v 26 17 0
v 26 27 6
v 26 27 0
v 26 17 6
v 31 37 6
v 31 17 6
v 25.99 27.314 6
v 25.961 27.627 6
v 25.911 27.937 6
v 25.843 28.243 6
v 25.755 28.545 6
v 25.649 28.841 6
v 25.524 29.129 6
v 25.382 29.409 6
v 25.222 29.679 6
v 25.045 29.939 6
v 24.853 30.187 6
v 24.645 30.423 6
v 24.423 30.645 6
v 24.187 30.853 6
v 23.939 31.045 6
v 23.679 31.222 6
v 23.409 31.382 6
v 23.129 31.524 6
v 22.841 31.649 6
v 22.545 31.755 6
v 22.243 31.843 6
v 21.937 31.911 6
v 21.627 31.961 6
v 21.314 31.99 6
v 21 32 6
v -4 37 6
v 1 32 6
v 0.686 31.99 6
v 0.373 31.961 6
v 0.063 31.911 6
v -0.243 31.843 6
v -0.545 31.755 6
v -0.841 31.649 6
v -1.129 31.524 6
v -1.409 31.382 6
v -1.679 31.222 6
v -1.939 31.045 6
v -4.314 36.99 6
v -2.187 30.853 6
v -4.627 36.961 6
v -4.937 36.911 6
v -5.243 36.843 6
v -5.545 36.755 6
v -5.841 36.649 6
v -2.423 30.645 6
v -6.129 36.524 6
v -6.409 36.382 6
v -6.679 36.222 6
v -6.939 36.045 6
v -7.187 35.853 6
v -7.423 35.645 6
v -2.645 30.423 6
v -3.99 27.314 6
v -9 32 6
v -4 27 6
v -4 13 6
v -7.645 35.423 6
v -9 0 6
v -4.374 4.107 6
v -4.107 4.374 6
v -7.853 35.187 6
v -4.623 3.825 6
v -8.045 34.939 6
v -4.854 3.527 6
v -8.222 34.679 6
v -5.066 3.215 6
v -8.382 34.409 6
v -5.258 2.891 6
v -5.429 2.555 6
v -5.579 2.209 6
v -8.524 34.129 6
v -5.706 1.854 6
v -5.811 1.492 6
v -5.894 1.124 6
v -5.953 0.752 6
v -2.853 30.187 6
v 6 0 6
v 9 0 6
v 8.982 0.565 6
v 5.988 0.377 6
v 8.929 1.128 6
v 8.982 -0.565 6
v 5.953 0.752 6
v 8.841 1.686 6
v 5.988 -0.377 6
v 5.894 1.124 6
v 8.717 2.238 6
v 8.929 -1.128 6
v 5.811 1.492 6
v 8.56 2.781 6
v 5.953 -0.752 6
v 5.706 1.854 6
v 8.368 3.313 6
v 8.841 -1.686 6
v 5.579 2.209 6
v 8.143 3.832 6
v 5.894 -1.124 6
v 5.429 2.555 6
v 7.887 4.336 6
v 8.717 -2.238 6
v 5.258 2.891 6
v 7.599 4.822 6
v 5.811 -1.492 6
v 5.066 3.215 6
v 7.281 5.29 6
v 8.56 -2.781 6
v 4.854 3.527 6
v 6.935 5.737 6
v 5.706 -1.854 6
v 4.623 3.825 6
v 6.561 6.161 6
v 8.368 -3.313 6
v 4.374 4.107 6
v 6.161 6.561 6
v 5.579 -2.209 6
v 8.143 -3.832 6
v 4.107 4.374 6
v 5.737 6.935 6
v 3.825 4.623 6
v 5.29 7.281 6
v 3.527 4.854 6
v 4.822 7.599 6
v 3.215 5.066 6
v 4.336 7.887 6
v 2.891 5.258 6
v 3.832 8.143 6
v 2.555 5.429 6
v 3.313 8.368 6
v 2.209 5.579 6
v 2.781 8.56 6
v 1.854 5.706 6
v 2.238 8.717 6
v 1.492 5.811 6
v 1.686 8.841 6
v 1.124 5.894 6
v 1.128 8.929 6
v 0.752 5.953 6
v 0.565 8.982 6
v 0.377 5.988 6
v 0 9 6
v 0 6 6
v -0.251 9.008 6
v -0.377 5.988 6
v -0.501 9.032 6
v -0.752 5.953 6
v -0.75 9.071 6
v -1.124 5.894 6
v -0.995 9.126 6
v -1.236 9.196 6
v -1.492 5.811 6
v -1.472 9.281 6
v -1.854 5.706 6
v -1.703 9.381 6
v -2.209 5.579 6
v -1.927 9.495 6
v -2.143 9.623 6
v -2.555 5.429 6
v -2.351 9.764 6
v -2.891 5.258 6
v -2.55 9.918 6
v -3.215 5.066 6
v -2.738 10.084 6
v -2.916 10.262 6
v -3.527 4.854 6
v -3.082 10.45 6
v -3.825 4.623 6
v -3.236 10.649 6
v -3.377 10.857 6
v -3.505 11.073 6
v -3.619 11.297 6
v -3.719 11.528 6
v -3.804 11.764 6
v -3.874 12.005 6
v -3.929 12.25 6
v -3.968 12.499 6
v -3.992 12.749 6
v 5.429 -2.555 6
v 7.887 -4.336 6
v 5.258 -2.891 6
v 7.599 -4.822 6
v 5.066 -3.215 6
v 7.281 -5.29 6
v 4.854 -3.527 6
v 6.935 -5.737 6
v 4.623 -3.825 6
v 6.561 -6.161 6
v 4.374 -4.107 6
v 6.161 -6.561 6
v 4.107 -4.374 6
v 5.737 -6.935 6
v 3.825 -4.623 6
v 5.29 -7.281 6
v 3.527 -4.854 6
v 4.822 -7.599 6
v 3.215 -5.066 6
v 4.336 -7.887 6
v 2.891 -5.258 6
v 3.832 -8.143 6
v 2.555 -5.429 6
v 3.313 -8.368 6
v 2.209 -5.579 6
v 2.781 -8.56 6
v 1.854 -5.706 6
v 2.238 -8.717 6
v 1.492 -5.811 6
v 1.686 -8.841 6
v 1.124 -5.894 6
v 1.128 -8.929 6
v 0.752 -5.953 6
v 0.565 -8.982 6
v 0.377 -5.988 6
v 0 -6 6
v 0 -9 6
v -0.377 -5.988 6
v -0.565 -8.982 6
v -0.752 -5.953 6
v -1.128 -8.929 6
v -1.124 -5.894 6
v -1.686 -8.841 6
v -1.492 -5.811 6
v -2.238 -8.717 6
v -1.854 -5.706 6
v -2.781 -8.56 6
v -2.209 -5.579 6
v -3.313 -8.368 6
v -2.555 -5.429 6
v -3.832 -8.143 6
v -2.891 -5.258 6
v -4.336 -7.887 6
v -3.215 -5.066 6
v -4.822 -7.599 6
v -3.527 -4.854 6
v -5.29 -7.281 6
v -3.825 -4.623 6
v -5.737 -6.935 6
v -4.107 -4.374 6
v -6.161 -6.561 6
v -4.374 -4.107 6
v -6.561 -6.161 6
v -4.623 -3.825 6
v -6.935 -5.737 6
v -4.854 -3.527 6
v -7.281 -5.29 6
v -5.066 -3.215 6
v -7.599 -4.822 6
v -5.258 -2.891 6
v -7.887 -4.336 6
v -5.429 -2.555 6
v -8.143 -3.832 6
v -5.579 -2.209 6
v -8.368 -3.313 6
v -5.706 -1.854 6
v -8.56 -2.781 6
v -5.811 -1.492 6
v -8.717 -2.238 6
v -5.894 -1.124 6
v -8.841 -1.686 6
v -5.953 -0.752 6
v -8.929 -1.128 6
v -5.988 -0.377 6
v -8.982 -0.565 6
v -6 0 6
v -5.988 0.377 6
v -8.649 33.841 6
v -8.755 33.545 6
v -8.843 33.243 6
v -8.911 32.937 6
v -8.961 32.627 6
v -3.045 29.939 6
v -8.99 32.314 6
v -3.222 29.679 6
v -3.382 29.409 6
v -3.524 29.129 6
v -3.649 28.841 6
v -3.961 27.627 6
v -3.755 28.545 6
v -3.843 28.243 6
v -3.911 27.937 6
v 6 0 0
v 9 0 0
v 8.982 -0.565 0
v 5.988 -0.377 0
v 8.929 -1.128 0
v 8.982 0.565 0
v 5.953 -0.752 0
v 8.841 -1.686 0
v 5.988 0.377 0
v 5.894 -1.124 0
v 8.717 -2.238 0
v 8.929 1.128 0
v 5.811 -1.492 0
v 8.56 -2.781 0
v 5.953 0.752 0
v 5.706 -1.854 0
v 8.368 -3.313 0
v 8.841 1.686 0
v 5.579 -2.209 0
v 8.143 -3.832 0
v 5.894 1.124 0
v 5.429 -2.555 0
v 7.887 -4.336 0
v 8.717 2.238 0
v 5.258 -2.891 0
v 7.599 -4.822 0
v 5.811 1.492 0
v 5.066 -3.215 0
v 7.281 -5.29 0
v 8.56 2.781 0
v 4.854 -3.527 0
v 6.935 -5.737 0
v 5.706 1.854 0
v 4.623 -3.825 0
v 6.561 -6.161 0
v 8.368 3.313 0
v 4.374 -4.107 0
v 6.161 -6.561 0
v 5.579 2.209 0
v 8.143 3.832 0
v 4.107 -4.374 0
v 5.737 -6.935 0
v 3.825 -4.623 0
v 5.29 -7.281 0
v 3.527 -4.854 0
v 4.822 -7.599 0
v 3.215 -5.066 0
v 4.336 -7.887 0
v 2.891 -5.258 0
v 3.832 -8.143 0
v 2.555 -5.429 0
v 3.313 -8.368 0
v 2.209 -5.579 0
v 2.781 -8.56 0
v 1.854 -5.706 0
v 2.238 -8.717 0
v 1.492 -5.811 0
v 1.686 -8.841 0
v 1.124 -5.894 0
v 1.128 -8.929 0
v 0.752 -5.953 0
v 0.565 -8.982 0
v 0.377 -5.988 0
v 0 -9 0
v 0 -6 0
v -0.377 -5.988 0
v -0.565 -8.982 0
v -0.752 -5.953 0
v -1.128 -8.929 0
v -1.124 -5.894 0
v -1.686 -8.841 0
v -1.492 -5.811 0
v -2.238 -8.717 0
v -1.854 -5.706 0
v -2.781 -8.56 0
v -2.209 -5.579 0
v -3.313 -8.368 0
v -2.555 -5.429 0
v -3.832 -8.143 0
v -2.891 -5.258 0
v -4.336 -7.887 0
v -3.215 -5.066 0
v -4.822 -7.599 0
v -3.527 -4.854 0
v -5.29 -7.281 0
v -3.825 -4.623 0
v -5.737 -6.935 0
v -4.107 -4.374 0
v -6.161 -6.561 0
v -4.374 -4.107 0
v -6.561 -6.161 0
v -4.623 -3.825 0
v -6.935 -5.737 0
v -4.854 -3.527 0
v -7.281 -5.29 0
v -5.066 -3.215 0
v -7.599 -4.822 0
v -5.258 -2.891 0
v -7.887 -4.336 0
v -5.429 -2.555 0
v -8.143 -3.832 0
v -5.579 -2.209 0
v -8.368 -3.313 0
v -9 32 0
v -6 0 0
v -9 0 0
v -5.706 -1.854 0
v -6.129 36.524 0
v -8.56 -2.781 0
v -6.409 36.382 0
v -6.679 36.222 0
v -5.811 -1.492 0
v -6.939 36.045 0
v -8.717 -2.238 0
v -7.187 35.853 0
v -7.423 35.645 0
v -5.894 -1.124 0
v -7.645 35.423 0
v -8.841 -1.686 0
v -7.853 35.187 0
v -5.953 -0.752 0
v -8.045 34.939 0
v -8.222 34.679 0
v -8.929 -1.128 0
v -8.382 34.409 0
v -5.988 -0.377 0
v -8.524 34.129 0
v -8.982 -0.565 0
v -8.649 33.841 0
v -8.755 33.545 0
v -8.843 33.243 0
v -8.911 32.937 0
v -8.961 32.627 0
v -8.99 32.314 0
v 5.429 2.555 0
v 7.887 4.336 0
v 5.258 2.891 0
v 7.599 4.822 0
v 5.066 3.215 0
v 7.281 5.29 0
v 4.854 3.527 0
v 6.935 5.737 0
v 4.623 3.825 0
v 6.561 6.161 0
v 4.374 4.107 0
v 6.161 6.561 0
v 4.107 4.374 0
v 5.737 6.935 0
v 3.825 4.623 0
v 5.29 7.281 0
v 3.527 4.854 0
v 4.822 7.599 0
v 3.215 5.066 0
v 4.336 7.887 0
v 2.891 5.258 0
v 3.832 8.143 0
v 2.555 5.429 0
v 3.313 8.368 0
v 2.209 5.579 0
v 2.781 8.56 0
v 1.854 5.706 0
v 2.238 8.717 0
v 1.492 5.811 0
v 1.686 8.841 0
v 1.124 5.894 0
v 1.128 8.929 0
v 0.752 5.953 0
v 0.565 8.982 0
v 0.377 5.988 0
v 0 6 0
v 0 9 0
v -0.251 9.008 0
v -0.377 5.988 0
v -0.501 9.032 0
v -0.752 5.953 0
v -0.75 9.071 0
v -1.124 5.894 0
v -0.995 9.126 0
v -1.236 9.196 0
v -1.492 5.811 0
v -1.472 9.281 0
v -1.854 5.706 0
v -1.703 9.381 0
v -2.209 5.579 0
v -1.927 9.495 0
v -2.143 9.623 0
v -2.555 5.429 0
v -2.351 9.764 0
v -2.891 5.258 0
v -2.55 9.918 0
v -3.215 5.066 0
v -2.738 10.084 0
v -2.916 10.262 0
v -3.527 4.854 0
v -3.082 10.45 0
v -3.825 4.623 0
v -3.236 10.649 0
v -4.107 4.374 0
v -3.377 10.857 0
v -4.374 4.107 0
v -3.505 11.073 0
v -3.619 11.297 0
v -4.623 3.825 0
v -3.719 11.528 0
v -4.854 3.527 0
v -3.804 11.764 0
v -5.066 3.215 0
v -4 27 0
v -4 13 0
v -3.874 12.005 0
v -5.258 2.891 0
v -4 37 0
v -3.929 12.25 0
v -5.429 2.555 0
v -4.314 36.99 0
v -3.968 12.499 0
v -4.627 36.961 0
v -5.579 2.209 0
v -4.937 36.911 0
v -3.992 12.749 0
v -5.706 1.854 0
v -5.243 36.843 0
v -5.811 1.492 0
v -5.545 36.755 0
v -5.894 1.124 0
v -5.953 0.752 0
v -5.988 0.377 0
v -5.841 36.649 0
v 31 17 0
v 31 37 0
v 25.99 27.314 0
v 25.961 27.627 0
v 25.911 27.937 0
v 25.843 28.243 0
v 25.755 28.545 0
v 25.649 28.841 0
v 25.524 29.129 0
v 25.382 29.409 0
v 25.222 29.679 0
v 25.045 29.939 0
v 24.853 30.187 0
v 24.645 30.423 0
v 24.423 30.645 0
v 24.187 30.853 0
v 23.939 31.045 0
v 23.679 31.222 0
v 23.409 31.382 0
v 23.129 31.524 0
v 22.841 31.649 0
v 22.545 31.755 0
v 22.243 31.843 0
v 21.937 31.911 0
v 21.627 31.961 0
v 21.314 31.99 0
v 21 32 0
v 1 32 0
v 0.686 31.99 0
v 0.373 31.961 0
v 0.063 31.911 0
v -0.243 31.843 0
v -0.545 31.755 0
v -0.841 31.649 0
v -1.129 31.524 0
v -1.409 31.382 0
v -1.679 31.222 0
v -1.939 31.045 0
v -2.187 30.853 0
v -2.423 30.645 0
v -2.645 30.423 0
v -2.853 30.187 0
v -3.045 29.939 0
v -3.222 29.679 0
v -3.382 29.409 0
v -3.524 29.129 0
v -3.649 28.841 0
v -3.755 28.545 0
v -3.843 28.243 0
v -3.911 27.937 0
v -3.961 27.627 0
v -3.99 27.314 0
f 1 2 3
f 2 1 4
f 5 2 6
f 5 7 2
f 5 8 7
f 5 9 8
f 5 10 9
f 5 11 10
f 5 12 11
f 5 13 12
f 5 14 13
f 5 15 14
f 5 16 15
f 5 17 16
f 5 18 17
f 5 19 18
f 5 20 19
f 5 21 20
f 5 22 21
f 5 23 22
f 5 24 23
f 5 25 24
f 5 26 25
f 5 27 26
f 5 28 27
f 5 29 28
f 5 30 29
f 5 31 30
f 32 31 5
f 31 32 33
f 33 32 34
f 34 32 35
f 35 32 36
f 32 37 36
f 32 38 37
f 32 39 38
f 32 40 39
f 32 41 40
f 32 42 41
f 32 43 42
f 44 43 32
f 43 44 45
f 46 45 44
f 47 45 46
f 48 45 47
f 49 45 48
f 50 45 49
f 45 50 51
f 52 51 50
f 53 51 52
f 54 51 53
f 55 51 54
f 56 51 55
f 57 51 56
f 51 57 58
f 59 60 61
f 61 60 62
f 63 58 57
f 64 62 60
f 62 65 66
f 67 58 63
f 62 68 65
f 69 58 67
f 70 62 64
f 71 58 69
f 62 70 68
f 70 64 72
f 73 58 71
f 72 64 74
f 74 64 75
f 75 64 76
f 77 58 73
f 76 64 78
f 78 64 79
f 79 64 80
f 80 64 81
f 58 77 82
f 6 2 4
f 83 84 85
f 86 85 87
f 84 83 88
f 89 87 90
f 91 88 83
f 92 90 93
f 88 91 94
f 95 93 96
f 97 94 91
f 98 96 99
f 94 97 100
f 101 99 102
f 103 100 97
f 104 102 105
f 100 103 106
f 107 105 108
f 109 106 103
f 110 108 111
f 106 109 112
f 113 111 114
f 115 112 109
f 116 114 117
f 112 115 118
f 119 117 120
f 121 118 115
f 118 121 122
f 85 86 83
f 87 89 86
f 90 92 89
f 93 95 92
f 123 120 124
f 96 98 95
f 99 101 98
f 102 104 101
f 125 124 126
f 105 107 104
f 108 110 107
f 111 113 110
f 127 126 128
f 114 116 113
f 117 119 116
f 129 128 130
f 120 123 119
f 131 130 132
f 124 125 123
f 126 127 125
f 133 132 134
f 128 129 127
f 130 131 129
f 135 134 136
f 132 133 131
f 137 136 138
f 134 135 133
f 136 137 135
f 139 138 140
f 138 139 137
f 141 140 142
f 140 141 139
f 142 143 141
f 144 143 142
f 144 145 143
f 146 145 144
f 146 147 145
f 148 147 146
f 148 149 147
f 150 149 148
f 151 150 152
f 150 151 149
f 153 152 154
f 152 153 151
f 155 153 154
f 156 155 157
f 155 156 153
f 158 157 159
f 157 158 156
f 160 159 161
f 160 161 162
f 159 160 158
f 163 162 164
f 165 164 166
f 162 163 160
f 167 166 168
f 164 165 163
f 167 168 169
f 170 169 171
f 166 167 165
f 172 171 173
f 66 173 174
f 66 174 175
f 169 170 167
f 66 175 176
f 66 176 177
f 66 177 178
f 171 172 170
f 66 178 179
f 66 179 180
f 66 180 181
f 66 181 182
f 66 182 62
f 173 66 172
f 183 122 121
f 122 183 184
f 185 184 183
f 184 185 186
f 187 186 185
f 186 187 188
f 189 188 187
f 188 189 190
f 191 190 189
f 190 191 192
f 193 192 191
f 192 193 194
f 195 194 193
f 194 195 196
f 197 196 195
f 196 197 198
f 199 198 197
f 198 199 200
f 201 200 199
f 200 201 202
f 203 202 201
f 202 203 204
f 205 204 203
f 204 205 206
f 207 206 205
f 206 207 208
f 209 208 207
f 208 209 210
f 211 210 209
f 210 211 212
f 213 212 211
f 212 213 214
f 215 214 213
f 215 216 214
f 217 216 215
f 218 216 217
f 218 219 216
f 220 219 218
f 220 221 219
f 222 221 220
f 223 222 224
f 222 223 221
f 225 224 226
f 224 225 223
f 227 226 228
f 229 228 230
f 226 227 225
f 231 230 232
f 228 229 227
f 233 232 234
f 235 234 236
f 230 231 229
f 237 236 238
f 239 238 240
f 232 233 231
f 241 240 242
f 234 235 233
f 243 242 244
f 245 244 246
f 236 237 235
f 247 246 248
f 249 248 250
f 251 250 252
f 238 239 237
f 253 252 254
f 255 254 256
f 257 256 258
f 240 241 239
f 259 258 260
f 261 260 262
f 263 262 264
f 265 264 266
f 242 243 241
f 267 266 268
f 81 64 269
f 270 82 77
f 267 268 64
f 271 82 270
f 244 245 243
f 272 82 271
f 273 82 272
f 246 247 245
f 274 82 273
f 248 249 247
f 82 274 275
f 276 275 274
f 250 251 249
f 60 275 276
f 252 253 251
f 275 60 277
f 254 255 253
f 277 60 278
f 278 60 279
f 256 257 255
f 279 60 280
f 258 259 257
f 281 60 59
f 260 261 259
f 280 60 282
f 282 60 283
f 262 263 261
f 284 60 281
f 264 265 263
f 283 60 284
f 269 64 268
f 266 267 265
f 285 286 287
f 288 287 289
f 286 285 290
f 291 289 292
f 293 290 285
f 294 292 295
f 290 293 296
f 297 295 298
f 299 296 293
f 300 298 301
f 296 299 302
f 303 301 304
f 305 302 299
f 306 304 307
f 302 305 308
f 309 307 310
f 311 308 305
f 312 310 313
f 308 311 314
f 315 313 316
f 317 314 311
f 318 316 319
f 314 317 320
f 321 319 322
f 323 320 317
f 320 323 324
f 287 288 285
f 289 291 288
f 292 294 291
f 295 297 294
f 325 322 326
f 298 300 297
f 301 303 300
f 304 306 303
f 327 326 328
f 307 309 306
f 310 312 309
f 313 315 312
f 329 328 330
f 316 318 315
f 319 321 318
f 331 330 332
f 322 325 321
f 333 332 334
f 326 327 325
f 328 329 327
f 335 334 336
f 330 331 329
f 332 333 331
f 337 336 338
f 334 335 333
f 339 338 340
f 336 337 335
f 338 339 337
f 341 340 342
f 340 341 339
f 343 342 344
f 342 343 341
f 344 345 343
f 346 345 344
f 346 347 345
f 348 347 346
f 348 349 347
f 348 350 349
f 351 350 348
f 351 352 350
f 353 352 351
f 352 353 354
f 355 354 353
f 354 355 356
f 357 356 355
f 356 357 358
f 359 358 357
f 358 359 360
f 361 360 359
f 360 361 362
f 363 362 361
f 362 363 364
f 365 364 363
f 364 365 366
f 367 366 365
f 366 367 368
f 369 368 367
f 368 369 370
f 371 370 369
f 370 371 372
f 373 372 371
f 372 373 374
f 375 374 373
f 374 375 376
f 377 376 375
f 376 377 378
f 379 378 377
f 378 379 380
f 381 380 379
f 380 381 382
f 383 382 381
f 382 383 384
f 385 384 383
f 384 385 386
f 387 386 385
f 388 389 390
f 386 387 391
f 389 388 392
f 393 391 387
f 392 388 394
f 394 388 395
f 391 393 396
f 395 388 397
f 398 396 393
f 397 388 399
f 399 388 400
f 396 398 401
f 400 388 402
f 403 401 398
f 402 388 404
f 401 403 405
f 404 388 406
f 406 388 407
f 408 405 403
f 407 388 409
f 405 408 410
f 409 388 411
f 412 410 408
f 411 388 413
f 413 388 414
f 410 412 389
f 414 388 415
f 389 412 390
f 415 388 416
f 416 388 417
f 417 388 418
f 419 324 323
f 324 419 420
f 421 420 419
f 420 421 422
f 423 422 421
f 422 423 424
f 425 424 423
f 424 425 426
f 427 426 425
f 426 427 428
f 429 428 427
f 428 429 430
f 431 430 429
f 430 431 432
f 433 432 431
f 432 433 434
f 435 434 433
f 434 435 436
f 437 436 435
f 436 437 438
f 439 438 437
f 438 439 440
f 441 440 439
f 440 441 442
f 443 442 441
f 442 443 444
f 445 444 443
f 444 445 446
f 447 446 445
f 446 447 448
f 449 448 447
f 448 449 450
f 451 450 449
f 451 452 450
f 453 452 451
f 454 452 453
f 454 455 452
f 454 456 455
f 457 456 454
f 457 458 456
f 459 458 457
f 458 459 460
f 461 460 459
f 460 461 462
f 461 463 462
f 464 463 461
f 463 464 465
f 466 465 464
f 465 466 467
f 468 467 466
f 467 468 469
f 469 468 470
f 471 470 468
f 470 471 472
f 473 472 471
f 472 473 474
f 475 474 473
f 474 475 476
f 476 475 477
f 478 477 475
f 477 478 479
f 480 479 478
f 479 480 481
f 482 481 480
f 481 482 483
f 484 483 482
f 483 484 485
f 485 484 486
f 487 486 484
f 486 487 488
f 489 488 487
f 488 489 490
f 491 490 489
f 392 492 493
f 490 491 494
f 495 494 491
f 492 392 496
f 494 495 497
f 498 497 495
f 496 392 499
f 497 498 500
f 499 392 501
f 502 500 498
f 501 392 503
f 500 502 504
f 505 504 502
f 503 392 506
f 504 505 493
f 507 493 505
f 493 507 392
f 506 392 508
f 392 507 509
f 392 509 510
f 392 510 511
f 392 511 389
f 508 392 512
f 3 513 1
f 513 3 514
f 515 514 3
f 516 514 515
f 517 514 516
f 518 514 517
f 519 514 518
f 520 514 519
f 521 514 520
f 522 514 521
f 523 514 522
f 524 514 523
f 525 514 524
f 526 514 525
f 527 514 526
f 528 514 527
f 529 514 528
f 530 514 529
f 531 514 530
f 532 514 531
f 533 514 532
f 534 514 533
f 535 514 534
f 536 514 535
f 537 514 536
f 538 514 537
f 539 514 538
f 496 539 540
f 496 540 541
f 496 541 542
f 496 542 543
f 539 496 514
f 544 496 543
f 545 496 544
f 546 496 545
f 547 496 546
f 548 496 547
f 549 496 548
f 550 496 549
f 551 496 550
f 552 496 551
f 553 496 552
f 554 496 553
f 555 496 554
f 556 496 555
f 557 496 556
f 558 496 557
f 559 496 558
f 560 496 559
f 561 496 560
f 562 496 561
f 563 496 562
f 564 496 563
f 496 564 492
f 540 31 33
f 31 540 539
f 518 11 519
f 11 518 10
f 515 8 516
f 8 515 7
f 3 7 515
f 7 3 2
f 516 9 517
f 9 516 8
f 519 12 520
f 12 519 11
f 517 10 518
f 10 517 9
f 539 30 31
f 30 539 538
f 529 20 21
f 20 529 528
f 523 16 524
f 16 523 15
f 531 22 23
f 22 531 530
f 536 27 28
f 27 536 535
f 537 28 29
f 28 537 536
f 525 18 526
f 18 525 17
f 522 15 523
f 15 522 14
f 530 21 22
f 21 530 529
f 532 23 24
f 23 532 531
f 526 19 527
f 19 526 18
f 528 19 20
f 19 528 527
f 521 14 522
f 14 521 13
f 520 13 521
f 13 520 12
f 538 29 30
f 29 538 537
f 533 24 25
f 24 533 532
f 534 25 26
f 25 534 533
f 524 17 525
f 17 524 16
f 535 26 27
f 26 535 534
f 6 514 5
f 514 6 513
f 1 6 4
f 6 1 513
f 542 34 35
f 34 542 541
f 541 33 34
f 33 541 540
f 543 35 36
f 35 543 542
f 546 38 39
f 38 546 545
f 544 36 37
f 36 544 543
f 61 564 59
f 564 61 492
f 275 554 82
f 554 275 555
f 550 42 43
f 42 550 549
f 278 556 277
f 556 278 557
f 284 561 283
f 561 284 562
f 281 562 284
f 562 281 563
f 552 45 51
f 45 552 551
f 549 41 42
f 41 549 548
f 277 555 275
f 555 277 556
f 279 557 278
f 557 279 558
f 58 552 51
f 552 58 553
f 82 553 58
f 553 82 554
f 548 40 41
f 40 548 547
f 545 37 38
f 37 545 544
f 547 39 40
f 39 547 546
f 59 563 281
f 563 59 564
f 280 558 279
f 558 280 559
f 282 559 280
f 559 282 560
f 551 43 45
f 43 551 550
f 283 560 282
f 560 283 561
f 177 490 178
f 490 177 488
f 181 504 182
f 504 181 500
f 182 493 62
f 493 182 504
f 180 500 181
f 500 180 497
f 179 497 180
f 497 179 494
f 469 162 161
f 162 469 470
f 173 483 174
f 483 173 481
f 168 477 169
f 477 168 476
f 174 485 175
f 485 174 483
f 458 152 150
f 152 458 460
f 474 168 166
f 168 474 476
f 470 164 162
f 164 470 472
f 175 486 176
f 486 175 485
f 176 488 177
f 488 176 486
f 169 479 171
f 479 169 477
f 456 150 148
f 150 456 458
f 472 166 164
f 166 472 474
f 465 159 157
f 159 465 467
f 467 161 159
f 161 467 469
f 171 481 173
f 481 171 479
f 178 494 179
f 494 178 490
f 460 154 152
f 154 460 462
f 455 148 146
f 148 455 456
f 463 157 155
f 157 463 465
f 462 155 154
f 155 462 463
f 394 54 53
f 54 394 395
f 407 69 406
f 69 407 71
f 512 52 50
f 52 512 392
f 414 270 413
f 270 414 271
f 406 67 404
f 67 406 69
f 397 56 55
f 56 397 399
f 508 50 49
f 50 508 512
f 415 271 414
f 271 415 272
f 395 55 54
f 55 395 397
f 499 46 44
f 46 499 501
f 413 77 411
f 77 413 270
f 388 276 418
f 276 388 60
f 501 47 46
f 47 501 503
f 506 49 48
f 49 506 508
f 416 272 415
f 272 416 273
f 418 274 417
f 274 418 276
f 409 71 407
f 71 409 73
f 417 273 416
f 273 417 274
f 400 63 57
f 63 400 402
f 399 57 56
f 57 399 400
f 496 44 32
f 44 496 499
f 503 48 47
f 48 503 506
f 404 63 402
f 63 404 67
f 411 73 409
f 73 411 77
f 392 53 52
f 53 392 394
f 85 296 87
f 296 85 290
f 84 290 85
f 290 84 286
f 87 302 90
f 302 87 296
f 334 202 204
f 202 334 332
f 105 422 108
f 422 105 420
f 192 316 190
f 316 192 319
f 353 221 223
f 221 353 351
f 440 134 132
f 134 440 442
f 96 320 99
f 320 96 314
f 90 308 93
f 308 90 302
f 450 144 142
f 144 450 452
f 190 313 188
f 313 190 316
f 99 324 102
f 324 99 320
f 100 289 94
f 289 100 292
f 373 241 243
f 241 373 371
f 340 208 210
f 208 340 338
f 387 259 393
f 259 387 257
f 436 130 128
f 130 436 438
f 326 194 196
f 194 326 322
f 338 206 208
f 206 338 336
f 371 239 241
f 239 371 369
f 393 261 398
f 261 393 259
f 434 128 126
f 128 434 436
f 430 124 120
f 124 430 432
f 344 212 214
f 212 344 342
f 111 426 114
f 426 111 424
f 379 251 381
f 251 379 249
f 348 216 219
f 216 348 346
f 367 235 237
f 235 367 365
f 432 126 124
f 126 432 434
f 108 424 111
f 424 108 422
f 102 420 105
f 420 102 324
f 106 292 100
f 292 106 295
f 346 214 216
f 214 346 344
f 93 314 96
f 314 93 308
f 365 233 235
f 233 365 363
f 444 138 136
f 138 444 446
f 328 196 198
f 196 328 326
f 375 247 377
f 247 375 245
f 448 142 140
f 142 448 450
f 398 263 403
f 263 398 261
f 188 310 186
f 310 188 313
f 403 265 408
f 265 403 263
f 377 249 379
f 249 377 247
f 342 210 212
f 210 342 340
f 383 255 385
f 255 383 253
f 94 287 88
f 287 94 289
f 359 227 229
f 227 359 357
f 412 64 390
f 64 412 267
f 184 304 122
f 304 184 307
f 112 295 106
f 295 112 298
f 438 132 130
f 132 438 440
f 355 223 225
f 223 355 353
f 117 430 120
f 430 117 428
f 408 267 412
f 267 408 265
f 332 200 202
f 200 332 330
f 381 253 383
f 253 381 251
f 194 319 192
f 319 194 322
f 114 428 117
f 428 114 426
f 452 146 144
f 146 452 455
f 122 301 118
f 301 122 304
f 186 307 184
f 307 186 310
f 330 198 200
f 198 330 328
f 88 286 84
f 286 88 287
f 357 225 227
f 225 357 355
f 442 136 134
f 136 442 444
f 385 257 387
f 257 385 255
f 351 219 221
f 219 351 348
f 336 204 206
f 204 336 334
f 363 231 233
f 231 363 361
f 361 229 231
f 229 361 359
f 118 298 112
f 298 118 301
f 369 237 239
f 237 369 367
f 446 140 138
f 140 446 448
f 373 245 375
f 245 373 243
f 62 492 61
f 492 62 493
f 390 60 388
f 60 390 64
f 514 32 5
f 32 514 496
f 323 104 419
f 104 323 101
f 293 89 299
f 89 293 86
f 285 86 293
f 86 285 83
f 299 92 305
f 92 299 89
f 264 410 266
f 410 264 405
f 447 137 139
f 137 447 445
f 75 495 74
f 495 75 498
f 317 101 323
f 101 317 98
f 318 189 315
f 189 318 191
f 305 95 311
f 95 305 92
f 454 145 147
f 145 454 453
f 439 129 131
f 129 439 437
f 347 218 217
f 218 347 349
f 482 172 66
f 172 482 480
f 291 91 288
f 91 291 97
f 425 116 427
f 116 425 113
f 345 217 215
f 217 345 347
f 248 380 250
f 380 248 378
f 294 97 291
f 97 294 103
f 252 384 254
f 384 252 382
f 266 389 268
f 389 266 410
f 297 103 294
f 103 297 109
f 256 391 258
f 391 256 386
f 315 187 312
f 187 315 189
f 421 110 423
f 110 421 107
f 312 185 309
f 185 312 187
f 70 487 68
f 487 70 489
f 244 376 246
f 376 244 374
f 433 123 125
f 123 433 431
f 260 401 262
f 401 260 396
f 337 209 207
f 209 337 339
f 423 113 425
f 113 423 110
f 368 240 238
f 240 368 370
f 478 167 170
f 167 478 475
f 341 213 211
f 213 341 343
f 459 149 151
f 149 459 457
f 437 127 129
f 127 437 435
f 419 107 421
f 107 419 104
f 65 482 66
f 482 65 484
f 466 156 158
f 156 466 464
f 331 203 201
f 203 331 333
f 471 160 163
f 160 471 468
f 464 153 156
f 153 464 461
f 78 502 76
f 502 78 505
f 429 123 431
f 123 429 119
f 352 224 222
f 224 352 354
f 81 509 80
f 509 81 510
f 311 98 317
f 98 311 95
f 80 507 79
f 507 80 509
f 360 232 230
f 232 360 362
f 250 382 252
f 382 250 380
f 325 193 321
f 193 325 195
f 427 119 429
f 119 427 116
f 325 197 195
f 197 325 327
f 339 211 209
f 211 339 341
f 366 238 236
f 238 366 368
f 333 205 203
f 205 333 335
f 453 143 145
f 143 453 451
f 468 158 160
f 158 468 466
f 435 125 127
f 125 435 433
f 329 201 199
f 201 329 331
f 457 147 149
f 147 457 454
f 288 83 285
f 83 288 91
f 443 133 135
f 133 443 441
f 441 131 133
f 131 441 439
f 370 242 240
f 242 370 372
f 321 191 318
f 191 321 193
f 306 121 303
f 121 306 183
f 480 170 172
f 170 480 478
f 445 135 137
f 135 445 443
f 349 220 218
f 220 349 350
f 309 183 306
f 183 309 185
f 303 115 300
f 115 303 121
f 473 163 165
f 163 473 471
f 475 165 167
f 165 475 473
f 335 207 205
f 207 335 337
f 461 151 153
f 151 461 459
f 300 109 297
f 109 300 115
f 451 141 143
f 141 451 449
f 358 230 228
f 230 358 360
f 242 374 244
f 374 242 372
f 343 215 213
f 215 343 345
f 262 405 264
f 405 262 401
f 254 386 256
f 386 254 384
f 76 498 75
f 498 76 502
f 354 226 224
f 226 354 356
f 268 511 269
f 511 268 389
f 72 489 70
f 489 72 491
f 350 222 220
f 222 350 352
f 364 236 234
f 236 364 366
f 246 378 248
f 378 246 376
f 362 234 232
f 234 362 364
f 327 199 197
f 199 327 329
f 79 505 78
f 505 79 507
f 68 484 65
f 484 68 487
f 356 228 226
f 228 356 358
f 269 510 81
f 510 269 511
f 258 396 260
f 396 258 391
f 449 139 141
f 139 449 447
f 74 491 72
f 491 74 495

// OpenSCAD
/*
 * file: cabinet-door-locker.scad
 * author: gregor binder <gregor_reprap@catrix.at>
 * date: 18.11.2013
 * last change: 18.11.2013
 * license: CC BY-NC-SA 3.0
 */

holediameter=12;
holestrengthening=3;
thickness=6;
length1=32;
height1=5;
length2=35;
radius=5;
securepart_length=15;
securepart_height=5;
$fn=100;

/*****************************/

outter_radius=(holediameter/2)+holestrengthening;
tempradius=(outter_radius-height1);

module securepart() {
	if (securepart_length>0 && securepart_height>0) {
		cube([securepart_height,securepart_length,thickness]);
		translate([-securepart_height,securepart_length-radius,0]) {
			difference() {
				cube([radius,radius,thickness]);
				translate([0,0,-0.5])
					cylinder(h=thickness+5,r=radius);
			}
		}
	}
}

translate([-outter_radius+(height1+length2-securepart_height),length1-securepart_length,0])
	securepart();

union() {

translate([(-((holediameter/2)+holestrengthening))+height1+radius,length1-radius,0]) {
	rotate([0,0,90])
	difference() {
		cube([radius+1,radius+1,thickness]);
		translate([0,0,-0.5])
			cylinder(h=thickness+5,r=radius);
	}
}


translate([0,tempradius+outter_radius,0]) {
	rotate([0,0,180])
	difference(){
		cube([tempradius+holestrengthening,tempradius+holestrengthening,thickness]);
		translate([0,0,-0.5])		
			cylinder(h=thickness+5,r=tempradius);
	}
}

translate([(-((holediameter/2)+holestrengthening))+height1,length1,0])
difference() {
	cylinder(h=thickness,r=height1);
	translate([0,-height1,-0.5])
		cube([height1*2,height1*2,thickness+5]);
	translate([-height1,-height1*2,-0.5])
		cube([height1*2,height1*2,thickness+5]);
}

difference() {
union() {
cylinder(h=thickness,r=outter_radius);
translate([-((holediameter/2)+holestrengthening),0,0])
	cube([height1,length1,thickness]);
translate([(-((holediameter/2)+holestrengthening))+height1,length1,0])
	cube([length2,height1,thickness]);
}
translate([0,0,-0.5])
	cylinder(h=thickness+5,r=holediameter/2);
}
}
